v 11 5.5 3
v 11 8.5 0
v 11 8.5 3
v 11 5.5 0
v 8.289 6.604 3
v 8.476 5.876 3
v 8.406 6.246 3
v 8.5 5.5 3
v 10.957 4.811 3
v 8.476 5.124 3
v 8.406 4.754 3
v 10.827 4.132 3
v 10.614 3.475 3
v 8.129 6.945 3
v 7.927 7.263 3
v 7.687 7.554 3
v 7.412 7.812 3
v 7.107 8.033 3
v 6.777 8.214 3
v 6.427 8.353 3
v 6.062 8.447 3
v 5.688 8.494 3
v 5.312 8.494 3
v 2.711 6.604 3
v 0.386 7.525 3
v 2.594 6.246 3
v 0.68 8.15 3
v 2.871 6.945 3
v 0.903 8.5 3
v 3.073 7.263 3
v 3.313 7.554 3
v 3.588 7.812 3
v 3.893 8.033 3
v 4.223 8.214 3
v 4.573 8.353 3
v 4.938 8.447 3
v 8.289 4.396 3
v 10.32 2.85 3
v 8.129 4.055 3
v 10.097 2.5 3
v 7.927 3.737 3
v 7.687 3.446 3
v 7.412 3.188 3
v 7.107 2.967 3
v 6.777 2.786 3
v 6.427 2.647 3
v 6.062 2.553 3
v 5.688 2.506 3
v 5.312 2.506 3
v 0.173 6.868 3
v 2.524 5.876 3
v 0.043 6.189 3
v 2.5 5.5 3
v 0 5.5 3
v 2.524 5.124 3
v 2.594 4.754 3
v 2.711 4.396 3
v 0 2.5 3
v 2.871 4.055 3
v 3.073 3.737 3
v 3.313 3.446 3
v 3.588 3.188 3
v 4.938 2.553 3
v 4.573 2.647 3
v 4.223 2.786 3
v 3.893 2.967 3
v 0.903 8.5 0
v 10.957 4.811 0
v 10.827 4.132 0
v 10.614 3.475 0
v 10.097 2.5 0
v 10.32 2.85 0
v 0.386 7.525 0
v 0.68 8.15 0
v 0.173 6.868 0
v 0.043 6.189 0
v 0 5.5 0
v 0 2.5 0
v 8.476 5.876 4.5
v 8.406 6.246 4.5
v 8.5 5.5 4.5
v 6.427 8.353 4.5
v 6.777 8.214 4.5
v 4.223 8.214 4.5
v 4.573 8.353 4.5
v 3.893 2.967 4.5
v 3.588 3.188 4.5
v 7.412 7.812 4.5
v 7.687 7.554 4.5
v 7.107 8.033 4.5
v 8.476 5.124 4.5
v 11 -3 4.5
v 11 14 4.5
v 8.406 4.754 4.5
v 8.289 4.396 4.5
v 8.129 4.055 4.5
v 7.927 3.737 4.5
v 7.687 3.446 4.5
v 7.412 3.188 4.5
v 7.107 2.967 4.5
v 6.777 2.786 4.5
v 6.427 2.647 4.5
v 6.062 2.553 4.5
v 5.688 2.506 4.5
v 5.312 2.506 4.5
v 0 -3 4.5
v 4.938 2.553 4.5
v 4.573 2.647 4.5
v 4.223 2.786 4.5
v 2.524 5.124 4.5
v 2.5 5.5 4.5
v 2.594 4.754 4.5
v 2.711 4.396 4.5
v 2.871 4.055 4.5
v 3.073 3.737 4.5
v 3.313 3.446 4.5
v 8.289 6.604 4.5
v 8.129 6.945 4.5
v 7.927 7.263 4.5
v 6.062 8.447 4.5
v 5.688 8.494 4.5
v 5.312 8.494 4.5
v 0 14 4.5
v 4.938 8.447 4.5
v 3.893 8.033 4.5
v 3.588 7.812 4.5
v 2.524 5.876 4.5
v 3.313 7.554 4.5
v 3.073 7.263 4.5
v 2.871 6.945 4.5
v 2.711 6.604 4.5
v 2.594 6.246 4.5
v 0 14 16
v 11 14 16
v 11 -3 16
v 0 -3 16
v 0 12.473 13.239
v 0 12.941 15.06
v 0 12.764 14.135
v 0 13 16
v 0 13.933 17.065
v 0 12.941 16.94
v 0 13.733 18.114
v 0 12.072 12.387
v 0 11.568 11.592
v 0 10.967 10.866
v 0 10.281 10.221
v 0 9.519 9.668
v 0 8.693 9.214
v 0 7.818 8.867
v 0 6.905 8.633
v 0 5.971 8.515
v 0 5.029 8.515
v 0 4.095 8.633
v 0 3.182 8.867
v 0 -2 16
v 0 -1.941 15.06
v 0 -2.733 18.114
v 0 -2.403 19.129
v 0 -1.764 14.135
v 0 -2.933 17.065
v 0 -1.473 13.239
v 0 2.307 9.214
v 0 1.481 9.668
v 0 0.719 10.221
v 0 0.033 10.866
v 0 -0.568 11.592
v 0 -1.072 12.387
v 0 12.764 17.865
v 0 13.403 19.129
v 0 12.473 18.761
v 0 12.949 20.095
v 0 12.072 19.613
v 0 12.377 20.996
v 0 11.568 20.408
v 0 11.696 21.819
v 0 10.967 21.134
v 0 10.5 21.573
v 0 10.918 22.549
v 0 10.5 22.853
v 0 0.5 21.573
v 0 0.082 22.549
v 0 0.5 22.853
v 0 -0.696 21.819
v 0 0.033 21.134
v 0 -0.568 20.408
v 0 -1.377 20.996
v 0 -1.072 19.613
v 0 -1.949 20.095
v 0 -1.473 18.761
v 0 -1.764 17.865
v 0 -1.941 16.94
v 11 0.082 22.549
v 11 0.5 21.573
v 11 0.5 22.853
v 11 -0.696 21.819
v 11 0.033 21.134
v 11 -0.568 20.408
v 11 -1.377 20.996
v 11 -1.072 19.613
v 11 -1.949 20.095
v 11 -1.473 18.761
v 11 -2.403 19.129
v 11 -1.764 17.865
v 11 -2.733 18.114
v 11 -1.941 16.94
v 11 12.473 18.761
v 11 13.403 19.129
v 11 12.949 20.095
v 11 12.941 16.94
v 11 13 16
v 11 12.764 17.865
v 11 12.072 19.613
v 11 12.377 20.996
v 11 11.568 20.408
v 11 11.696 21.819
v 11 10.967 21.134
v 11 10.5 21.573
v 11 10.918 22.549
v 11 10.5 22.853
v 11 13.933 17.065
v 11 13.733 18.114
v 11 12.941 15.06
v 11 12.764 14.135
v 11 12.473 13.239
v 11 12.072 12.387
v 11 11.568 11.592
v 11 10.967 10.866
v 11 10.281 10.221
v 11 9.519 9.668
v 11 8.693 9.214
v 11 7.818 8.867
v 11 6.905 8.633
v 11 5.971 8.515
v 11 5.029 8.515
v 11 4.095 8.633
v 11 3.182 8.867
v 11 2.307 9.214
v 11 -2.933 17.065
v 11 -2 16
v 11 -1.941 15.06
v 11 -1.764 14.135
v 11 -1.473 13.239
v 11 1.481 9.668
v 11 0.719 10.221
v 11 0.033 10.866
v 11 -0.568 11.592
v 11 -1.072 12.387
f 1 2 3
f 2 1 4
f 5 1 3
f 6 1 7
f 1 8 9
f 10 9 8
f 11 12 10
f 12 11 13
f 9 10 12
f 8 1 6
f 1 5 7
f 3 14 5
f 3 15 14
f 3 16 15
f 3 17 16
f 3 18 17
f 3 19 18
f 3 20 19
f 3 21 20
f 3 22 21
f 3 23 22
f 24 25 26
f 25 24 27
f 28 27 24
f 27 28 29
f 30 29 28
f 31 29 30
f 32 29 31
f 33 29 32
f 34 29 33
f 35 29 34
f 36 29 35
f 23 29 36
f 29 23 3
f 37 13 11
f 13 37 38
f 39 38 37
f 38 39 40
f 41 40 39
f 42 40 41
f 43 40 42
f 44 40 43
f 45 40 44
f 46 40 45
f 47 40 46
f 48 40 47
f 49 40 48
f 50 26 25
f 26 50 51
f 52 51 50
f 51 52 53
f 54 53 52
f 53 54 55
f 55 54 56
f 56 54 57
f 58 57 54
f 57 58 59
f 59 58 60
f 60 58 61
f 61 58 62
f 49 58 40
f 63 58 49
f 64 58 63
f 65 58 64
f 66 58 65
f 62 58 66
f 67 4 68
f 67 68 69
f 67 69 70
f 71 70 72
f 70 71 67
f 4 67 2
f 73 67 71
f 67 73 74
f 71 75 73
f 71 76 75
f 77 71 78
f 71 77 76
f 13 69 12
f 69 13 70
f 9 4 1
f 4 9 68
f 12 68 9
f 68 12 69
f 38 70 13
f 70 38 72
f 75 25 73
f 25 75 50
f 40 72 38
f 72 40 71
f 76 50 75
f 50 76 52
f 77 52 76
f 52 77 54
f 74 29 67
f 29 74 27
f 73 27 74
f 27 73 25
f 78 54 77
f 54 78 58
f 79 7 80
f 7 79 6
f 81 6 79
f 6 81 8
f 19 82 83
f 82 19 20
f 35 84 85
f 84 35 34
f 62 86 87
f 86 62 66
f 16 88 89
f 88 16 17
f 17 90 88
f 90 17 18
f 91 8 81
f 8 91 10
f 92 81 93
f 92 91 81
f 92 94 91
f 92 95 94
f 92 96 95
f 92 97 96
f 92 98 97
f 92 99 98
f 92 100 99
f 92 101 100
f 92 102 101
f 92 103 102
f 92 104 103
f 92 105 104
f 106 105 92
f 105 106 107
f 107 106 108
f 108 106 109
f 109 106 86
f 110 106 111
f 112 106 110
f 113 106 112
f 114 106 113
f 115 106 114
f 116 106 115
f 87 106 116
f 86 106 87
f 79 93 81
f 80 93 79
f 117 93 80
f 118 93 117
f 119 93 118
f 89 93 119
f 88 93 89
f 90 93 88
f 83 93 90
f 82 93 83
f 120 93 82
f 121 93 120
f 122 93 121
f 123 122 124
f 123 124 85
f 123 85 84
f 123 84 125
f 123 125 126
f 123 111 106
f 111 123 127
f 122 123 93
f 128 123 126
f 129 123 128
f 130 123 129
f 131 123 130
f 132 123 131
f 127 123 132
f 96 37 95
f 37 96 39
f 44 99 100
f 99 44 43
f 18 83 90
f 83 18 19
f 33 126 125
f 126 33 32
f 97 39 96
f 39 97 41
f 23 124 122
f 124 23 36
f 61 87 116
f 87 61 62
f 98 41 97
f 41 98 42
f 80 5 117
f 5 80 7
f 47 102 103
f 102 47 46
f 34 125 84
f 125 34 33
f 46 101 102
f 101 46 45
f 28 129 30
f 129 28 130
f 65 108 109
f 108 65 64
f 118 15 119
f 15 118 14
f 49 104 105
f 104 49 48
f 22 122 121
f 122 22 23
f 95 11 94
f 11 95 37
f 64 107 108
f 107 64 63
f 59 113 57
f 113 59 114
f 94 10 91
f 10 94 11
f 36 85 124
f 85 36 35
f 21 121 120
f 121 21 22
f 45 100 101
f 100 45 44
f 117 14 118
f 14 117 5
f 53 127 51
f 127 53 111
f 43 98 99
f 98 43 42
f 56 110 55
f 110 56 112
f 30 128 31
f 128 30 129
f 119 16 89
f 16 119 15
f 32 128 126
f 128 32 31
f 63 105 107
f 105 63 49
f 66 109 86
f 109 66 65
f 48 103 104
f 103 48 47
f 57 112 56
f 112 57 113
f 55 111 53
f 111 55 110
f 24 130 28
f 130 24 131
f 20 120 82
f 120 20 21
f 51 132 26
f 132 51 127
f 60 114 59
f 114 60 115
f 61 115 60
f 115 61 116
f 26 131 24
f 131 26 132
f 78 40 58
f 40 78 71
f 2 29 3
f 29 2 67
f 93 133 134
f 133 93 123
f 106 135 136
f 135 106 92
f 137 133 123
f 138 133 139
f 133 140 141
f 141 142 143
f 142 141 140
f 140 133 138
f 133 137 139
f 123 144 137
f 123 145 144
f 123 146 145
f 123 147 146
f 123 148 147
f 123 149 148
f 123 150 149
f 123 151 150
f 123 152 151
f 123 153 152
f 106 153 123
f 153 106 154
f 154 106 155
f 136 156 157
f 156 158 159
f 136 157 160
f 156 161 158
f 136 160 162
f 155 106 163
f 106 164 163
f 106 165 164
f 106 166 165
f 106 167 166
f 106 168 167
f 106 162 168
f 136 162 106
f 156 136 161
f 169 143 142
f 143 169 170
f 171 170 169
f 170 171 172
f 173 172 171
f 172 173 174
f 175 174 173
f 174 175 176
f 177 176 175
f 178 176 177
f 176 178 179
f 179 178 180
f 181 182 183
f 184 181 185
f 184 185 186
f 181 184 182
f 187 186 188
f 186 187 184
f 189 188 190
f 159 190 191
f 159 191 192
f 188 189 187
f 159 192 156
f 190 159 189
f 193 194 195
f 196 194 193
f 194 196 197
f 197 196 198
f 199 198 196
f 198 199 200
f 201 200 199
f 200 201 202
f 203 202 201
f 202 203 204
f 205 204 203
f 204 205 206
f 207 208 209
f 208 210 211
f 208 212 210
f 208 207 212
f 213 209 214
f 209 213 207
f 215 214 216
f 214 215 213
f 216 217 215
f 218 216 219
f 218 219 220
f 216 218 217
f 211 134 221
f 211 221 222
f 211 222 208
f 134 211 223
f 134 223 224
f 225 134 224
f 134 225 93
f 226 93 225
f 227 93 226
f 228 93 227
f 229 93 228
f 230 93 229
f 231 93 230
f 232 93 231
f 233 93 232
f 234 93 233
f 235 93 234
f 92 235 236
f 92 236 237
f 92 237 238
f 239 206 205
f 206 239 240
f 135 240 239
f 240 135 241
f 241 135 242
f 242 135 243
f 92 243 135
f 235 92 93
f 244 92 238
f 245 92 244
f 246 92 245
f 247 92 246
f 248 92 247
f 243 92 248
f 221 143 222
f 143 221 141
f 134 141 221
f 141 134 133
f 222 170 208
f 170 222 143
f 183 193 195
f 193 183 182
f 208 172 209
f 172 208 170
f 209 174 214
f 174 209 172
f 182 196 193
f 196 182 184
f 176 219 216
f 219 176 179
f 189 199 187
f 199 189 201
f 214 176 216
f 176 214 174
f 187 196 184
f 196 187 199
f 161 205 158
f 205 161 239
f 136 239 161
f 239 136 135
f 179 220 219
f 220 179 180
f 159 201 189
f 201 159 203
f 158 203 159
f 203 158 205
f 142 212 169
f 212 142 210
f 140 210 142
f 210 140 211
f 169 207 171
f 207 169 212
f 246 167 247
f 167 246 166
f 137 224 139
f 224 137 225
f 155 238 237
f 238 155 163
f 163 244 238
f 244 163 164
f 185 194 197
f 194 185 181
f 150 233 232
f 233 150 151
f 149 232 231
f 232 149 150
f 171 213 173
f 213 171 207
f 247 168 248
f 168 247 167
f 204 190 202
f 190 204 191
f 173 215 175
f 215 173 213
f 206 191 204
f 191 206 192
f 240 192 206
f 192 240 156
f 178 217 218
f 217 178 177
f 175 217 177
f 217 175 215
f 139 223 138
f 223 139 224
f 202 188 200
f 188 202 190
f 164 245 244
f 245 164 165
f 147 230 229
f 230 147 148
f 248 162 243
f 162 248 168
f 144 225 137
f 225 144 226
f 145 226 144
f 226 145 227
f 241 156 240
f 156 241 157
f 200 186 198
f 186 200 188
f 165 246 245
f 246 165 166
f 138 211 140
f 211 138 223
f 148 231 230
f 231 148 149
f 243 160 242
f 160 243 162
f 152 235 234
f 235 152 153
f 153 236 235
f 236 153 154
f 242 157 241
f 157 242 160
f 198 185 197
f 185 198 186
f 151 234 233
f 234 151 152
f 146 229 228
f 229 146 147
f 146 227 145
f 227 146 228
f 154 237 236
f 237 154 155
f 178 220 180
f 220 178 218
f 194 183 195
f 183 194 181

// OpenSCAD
channel_width =11;
channel_depth = 3;
slot_width = 6;
slot_depth = 1.5;
clip_diameter = 15;
clip_width = channel_width;
clip_standoff = 4;

top_width = 10;
top_depth = 2;

a = channel_width / 2;
b = slot_width / 2;
c = clip_diameter / 2;


module base() {
	difference() {
		union() {
			cube([a, a, channel_depth]);
			translate([a, a, 0]) {
				cube([a, a, channel_depth]);
				cylinder(channel_depth, a, a, $fn=50);
			}

			translate([a, a, channel_depth]) cylinder(slot_depth, b, b, $fn=50);
		}
		translate([-0.5, -b, -0.5]) cube([2 *a + 1, a, channel_depth + 1]);
		translate([-0.5, a + b, -0.5]) cube([2 *a + 1, a, channel_depth + 1]);
	}
}


module top() {
	translate([-(clip_diameter / 2 + 1), -clip_width / 2, 0]) difference() {
		union() {
			cube([clip_diameter + 2, clip_width, clip_diameter / 2 + clip_standoff]);
			translate([c + 1, clip_width, clip_diameter / 2 + clip_standoff]) rotate([90, 0 ,0]) cylinder(clip_width, c + 1, c + 1, $fn = 50);
		}
		union() {
			translate([c + 1, clip_width + 0.5, clip_diameter / 2 + clip_standoff]) rotate([90, 0 ,0]) cylinder(clip_width + 1, c, c, $fn = 50);
			translate([clip_diameter / 6 + 1, -0.5, clip_diameter / 2 + clip_standoff]) cube([clip_diameter * 2/3, clip_width + 1, clip_diameter]);
		}
	}
}

base();
translate([a, a, channel_depth + slot_depth]) rotate([0, 0, 90]) top();
